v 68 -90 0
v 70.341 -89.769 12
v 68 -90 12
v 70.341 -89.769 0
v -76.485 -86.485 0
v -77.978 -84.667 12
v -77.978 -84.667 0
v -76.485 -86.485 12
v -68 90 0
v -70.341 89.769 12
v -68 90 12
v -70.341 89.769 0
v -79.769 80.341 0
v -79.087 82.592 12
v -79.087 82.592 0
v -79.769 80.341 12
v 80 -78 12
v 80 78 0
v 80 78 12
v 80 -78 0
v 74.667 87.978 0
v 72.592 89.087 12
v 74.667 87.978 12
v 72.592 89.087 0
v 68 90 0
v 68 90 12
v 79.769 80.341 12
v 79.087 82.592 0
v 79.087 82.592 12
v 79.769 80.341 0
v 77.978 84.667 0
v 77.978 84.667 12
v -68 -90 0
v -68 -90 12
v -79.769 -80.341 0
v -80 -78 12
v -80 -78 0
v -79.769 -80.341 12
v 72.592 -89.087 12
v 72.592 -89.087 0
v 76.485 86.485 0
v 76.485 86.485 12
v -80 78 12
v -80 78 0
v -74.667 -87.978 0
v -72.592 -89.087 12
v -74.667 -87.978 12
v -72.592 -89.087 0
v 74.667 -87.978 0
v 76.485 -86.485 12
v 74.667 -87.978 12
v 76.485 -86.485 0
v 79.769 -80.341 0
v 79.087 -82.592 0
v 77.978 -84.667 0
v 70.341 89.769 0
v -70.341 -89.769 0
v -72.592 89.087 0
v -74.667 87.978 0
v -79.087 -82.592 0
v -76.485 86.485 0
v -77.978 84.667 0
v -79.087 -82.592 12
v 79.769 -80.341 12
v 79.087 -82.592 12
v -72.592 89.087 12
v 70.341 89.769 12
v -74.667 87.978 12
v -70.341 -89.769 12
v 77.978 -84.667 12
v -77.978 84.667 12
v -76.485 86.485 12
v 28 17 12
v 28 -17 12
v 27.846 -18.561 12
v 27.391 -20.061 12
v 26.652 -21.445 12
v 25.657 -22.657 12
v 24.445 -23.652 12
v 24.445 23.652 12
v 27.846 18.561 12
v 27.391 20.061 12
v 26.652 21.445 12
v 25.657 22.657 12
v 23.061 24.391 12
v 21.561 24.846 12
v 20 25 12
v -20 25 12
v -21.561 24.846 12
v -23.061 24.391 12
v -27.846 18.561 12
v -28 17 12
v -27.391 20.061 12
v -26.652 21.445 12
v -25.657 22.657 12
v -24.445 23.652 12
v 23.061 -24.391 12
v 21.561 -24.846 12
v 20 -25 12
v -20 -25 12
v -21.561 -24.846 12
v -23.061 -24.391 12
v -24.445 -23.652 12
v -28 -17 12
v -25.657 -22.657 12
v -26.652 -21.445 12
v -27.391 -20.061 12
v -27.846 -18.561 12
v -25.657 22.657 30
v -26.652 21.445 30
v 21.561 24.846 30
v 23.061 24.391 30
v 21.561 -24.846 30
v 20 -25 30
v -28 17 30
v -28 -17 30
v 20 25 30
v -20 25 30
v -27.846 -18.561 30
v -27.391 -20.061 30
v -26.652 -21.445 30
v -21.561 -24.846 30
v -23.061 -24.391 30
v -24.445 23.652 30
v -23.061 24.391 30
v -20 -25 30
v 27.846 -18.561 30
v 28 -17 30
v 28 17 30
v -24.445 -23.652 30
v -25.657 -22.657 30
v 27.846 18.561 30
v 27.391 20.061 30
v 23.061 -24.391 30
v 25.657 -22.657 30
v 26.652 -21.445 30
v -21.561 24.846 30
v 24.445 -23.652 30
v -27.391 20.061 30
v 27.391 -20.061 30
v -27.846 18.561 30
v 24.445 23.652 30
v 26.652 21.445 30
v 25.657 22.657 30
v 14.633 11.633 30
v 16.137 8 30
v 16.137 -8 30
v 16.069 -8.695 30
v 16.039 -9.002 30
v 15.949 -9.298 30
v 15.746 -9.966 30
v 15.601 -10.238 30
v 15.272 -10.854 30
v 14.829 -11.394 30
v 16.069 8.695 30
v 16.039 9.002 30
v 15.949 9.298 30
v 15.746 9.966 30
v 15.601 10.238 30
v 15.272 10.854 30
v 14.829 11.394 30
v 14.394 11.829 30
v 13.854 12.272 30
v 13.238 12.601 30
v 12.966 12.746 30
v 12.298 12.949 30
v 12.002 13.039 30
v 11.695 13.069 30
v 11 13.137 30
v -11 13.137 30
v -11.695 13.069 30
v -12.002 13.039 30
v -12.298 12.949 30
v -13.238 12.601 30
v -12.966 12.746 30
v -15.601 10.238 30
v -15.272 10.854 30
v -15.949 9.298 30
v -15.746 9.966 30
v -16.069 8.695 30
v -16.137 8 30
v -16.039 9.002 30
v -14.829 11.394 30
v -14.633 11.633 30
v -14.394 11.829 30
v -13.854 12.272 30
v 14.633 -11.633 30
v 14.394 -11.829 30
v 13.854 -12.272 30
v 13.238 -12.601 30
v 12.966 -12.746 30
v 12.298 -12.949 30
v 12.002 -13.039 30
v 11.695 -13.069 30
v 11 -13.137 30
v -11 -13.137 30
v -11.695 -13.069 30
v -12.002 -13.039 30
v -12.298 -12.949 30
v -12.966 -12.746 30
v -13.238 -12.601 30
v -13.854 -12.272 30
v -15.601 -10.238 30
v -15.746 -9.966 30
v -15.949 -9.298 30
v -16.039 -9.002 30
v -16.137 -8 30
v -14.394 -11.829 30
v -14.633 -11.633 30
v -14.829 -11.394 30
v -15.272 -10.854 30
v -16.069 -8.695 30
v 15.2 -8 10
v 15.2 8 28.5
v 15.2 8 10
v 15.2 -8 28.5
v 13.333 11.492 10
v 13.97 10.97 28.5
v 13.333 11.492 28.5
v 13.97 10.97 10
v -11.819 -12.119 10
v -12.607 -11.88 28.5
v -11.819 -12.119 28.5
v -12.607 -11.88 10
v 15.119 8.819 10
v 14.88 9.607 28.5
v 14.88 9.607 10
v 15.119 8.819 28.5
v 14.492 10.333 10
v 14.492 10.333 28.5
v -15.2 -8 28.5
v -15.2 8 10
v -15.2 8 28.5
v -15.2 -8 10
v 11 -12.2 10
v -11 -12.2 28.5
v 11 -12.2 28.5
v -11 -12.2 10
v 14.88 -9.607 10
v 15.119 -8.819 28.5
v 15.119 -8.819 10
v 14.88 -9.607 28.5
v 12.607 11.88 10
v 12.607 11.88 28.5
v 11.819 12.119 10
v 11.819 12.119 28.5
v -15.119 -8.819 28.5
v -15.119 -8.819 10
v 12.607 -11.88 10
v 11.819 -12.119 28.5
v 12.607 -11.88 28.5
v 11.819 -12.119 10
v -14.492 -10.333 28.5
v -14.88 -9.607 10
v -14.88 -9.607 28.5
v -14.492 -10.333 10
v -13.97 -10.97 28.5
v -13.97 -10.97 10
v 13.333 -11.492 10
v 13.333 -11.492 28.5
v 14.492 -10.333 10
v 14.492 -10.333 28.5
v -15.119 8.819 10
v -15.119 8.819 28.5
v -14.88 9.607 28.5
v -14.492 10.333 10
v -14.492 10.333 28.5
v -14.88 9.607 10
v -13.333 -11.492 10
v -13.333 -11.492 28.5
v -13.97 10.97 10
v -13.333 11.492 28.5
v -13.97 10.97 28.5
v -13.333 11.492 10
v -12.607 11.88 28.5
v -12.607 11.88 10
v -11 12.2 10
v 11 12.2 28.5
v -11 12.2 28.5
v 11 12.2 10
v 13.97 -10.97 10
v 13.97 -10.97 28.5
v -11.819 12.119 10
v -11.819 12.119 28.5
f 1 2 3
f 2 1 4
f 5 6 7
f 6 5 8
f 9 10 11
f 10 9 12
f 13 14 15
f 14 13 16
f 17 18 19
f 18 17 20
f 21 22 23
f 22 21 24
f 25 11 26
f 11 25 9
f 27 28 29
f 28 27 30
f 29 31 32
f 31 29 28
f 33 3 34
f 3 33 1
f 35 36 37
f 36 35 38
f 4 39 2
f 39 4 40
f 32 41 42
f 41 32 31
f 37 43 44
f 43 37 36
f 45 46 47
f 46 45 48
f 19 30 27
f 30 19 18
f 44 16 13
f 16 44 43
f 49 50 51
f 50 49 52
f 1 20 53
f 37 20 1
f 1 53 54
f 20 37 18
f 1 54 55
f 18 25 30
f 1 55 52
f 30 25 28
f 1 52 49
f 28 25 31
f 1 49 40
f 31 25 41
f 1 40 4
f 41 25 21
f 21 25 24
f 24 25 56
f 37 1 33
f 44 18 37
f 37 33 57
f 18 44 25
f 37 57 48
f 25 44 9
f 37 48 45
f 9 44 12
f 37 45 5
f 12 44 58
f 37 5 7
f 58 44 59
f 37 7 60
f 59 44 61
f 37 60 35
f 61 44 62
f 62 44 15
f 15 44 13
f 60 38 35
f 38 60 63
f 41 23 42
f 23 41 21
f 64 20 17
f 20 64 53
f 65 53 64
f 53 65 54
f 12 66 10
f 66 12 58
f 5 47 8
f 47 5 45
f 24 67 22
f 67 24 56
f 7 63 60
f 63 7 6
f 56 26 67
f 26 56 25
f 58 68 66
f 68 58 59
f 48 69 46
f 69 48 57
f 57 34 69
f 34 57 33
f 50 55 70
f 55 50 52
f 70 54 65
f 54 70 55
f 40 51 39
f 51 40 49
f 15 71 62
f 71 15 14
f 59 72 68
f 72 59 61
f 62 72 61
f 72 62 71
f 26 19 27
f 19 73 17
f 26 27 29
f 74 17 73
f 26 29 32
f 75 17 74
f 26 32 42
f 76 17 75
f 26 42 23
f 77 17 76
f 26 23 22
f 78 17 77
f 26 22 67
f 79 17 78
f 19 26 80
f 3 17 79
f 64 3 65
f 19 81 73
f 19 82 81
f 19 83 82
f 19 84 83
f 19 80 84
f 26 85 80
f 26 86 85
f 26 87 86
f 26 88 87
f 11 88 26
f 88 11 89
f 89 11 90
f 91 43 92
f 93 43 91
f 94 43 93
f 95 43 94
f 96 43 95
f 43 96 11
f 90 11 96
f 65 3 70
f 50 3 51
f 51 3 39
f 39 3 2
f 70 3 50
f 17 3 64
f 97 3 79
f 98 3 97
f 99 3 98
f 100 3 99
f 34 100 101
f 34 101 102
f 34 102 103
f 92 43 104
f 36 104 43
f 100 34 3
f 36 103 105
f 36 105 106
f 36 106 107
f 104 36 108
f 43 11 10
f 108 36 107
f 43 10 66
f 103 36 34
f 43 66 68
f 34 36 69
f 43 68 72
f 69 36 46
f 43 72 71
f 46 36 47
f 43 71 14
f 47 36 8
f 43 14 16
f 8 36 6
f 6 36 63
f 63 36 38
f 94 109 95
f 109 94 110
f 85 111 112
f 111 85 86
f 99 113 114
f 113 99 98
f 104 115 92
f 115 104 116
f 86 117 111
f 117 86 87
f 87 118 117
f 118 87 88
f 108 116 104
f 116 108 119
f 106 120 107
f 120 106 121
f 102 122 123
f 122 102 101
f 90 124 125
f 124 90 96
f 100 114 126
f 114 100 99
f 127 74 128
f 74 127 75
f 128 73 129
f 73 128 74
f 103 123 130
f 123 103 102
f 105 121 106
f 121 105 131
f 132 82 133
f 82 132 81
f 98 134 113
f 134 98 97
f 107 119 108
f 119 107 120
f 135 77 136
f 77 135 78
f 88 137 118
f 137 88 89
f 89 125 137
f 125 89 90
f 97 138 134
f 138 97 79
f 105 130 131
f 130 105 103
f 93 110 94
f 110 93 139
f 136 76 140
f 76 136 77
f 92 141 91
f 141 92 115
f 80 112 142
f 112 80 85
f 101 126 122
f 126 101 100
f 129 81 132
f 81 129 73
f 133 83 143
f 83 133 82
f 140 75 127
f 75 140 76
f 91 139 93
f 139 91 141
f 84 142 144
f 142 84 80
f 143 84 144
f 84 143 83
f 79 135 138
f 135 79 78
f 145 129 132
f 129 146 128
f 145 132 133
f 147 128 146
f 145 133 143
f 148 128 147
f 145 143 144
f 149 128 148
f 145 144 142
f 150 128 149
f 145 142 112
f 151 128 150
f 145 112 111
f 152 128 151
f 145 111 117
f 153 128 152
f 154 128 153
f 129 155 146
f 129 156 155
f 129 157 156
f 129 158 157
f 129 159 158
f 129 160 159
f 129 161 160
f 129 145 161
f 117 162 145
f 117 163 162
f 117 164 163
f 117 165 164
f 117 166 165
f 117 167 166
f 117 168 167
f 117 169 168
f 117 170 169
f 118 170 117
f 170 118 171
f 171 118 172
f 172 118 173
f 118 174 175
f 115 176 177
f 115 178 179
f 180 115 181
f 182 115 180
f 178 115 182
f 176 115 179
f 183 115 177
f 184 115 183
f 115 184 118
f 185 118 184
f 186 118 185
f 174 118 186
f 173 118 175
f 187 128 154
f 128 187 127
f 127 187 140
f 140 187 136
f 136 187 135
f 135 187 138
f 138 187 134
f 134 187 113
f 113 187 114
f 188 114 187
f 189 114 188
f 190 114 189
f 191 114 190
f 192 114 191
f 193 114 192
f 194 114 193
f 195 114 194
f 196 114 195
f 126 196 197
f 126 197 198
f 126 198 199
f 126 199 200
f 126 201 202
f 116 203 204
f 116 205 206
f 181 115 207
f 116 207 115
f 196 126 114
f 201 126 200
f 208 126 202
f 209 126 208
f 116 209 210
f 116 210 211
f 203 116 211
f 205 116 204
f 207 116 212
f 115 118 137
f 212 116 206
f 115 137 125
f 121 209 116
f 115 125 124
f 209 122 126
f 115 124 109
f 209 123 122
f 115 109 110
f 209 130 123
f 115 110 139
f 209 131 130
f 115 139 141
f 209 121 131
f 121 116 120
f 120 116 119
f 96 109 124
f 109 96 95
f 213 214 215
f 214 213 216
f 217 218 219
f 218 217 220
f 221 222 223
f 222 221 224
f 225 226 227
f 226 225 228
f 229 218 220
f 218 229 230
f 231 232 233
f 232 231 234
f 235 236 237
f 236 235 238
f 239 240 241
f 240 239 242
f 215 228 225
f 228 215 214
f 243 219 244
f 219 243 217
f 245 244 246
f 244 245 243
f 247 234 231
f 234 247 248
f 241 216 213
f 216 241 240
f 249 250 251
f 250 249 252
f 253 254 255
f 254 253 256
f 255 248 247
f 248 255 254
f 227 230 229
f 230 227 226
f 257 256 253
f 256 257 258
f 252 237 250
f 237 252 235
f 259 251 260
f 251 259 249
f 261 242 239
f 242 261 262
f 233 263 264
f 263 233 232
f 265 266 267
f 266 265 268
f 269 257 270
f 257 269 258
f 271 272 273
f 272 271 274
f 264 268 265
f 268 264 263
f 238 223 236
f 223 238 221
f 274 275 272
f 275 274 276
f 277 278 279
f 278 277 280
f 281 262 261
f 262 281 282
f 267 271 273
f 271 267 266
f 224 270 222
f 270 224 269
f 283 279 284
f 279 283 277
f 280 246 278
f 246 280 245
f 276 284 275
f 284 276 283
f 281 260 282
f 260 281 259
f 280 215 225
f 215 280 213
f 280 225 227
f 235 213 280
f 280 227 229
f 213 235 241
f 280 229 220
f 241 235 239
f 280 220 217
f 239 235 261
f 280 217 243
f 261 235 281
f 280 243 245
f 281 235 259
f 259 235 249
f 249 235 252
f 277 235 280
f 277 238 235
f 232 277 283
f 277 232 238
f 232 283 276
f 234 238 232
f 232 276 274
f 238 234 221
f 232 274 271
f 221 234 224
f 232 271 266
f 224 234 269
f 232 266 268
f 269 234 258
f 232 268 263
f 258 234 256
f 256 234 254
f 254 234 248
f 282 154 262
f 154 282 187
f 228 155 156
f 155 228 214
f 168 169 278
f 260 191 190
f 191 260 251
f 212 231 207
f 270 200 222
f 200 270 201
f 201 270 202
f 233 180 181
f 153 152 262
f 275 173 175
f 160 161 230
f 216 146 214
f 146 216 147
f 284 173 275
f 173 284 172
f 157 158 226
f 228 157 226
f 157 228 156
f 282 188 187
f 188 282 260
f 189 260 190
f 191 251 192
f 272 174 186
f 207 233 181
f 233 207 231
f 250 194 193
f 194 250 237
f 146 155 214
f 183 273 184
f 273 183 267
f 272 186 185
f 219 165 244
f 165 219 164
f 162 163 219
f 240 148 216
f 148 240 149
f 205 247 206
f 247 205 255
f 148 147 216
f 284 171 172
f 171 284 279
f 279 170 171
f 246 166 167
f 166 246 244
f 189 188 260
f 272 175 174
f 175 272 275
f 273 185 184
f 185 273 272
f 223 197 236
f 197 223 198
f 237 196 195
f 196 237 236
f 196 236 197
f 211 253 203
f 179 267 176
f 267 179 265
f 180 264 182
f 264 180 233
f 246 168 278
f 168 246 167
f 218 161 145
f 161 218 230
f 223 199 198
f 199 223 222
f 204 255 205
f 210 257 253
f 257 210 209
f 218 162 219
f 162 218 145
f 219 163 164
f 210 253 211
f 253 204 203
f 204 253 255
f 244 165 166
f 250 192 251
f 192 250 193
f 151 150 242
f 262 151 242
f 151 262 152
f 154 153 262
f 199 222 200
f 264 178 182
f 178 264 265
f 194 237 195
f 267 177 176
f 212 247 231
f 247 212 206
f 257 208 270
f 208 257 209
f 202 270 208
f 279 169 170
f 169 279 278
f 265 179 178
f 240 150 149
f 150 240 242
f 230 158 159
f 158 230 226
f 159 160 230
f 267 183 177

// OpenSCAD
// Headphone stand in three parts - PLA, no supports, 0.4mm nozzle
// Print orientations (+Z up, bottom on bed):
//   base   : flat, plate bottom on bed
//   post   : vertical, bottom on bed (250+ tall)
//   hanger : flat bottom on bed, curved top up, socket opening down (bridged)
// Assembly (desk Z=0): base 0-30, post 10-262, hanger 244-270 (top ~270)

part = "base"; // [base:Base, post:Post, hanger:Hanger, assembly:Assembly]
cadverify_only = "";
module instance(name, part, unit = 1) {
    echo(cadverify_instance = [name, part, unit]);
    if (cadverify_only == "" || cadverify_only == name) children();
}

// ---------- parameters ----------
baseW = 160; baseD = 180; baseT = 12; baseR = 12;
bossW = 56; bossD = 50; bossH = 18; bossR = 8;
bossTop = baseT + bossH; // 30
sockW = 30.4; sockD = 24.4; sockR = 4.2; // base socket (post 30x24 +0.4)
sockDepthBase = 20;
sockFloorBase = bossTop - sockDepthBase; // 10
flare = 1.5;
mouthWBase = sockW + 2*flare; mouthDBase = sockD + 2*flare; mouthRBase = sockR + flare;

postW = 30; postD = 24; postR = 4; postH = 252; postCham = 1.5;
tipW = postW - 2*postCham; tipD = postD - 2*postCham; tipR = 2.5;

hangW = 42; hangL = 120; hangZc = 26; hangZe = 14; hangFillet = 8; hangPlanR = 15;
hangSockW = 30.4; hangSockD = 24.4; hangSockR = 4.2; hangSockDepth = 18;
mouthWH = hangSockW + 2*flare; mouthDH = hangSockD + 2*flare; mouthRH = hangSockR + flare;

postZ = 10;          // post bottom in assembly
hangerZ = 244;       // hanger bottom in assembly -> top 270
// post top = postZ+postH = 262 = hangerZ+hangSockDepth (socket floor)

// ---------- helpers ----------
module rounded_box(W,D,H,R) {
    // centered in XY, bottom at Z=0
    if (R <= 0.01) {
        translate([-W/2,-D/2,0]) cube([W,D,H]);
    } else {
        hull() {
            for (sx=[-1,1], sy=[-1,1])
                translate([sx*(W/2-R), sy*(D/2-R), 0])
                    cylinder(r=R, h=H, $fn=32);
        }
    }
}
module rect_frustum(W1,D1,R1, W2,D2,R2, H) {
    // bottom size 1 at Z=0, top size 2 at Z=H
    hull() {
        translate([0,0,0]) rounded_box(W1,D1,0.1,R1);
        translate([0,0,H-0.1]) rounded_box(W2,D2,0.1,R2);
    }
}

// ---------- parts (print orientation, bottom Z=0, centered XY) ----------
module base_part() {
    difference() {
        union() {
            rounded_box(baseW, baseD, baseT, baseR);
            translate([0,0,baseT-0.2]) rounded_box(bossW, bossD, bossH+0.2, bossR);
        }
        // socket bore (extend above mouth for clean cut)
        translate([0,0,sockFloorBase]) rounded_box(sockW, sockD, sockDepthBase+1.0, sockR);
        // entry flare 45deg (mouth larger at top)
        translate([0,0,bossTop-flare])
            rect_frustum(sockW,sockD,sockR, mouthWBase,mouthDBase,mouthRBase, flare+1.0);
    }
}

module post_part() {
    union() {
        // middle shaft (overlap frustums)
        translate([0,0,postCham-0.2]) rounded_box(postW, postD, postH-2*postCham+0.4, postR);
        // bottom lead-in (small face on bed)
        translate([0,0,0]) rect_frustum(tipW,tipD,tipR, postW,postD,postR, postCham+0.2);
        // top lead-in
        translate([0,0,postH-postCham-0.2]) rect_frustum(postW,postD,postR, tipW,tipD,tipR, postCham+0.2);
    }
}

module hanger_A() {
    union() {
        // lower block 0 .. Zc-r
        translate([-hangW/2, -hangL/2, 0]) cube([hangW, hangL, hangZc-hangFillet]);
        // upper block (narrower) Zc-r .. top
        translate([-(hangW-2*hangFillet)/2, -hangL/2, hangZc-hangFillet])
            cube([hangW-2*hangFillet, hangL, hangFillet]);
        // two side fillet cylinders along Y
        for (sx=[-1,1])
            translate([sx*(hangW/2-hangFillet), -hangL/2, hangZc-hangFillet])
                rotate([-90,0,0])
                    cylinder(r=hangFillet, h=hangL, $fn=32);
    }
}
module hanger_B() {
    // hull of slices under parabolic top (convex hypograph)
    N = 25;
    hull() {
        for (i=[0:N-1]) {
            yi = -hangL/2 + hangL*i/(N-1);
            hi = hangZc - (hangZc-hangZe)*pow(2*yi/hangL,2);
            translate([-hangW/2, yi-0.3, 0]) cube([hangW, 0.6, hi]);
        }
    }
}
module hanger_D() {
    rounded_box(hangW, hangL, 30, hangPlanR);
}
module hanger_part() {
    difference() {
        intersection() {
            hanger_A();
            hanger_B();
            hanger_D();
        }
        // socket bore (extend below bed for clean cut)
        translate([0,0,-0.5]) rounded_box(hangSockW, hangSockD, hangSockDepth+0.5, hangSockR);
        // entry flare at mouth (bottom)
        translate([0,0,-0.5])
            rect_frustum(mouthWH,mouthDH,mouthRH, hangSockW,hangSockD,hangSockR, flare+0.5);
    }
}

// ---------- specs ----------
if (part == "base") {
    echo(cadverify_spec = [
        ["bounds", [[-baseW/2, -baseD/2, 0], [baseW/2, baseD/2, bossTop]]],
        ["bodies", 1],
        ["through_holes", 0],
        ["support_faces", [["bed", "-z", 20000]]],
        ["overhangs_allowed", []],
        ["copies", 1],
        ["details", [
            ["plate", "material", [[-baseW/2, -baseD/2, 0], [baseW/2, baseD/2, baseT]], 0.95],
            ["boss", "material", [[-bossW/2, -bossD/2, baseT], [bossW/2, bossD/2, bossTop]], 0.60],
            ["socket", "void", [[-sockW/2, -sockD/2, sockFloorBase], [sockW/2, sockD/2, bossTop]], 0.90],
            ["floor", "thickness", [0, 0, -5], [0, 0, 1], 10],
            ["corner", "view", [[65, 75, 0], [80, 90, 12]]],
            ["mouth", "view", [[-17, -14, 28], [17, 14, 30]]]
        ]]
    ]);
    base_part();
} else if (part == "post") {
    echo(cadverify_spec = [
        ["bounds", [[-postW/2, -postD/2, 0], [postW/2, postD/2, postH]]],
        ["bodies", 1],
        ["through_holes", 0],
        ["support_faces", [["bed", "-z", 400]]],
        ["overhangs_allowed", []],
        ["copies", 1],
        ["details", [
            ["shaft", "material", [[-9.5, -9.5, 10], [9.5, 9.5, 242]], 0.99],
            ["wall", "thickness", [30, 0, 126], [-1, 0, 0], 28],
            ["lead", "view", [[-15, -12, 0], [15, 12, 3]]],
            ["topcham", "view", [[-15, -12, 249], [15, 12, 252]]]
        ]]
    ]);
    post_part();
} else if (part == "hanger") {
    echo(cadverify_spec = [
        ["bounds", [[-hangW/2, -hangL/2, 0], [hangW/2, hangL/2, hangZc]]],
        ["bodies", 1],
        ["through_holes", 0],
        ["support_faces", [["bed", "-z", 2500]]],
        ["overhangs_allowed", [["bridging socket ceiling", [[-hangSockW/2, -hangSockD/2, 16], [hangSockW/2, hangSockD/2, 20]]]]],
        ["copies", 1],
        ["details", [
            ["contact", "material", [[-15, -30, 18], [15, 30, 22]], 0.95],
            ["socket", "void", [[-hangSockW/2, -hangSockD/2, 0], [hangSockW/2, hangSockD/2, hangSockDepth]], 0.90],
            ["topwall", "thickness", [0, 0, 30], [0, 0, -1], 8],
            ["fillet", "view", [[13, -20, 18], [21, 20, 26]]],
            ["arch", "view", [[-21, -60, 12], [21, -40, 16]]],
            ["mouth", "view", [[-17, -14, 0], [17, 14, 2]]]
        ]]
    ]);
    hanger_part();
} else if (part == "assembly") {
    echo(cadverify_spec = [
        ["bounds", [[-baseW/2, -baseD/2, 0], [baseW/2, baseD/2, hangerZ+hangZc]]],
        ["support_faces", [["desk", "-z", 20000]]],
        ["allowed_interferences", []],
        ["motions", []],
        ["assembly_order", [
            [["base_1"], [0, 0, 0]],
            [["post_1"], [0, 0, 1]],
            [["hanger_1"], [0, 0, 1]]
        ]]
    ]);
    instance("base_1", "base") translate([0,0,0]) base_part();
    instance("post_1", "post") translate([0,0,postZ]) post_part();
    instance("hanger_1", "hanger") translate([0,0,hangerZ]) hanger_part();
}
